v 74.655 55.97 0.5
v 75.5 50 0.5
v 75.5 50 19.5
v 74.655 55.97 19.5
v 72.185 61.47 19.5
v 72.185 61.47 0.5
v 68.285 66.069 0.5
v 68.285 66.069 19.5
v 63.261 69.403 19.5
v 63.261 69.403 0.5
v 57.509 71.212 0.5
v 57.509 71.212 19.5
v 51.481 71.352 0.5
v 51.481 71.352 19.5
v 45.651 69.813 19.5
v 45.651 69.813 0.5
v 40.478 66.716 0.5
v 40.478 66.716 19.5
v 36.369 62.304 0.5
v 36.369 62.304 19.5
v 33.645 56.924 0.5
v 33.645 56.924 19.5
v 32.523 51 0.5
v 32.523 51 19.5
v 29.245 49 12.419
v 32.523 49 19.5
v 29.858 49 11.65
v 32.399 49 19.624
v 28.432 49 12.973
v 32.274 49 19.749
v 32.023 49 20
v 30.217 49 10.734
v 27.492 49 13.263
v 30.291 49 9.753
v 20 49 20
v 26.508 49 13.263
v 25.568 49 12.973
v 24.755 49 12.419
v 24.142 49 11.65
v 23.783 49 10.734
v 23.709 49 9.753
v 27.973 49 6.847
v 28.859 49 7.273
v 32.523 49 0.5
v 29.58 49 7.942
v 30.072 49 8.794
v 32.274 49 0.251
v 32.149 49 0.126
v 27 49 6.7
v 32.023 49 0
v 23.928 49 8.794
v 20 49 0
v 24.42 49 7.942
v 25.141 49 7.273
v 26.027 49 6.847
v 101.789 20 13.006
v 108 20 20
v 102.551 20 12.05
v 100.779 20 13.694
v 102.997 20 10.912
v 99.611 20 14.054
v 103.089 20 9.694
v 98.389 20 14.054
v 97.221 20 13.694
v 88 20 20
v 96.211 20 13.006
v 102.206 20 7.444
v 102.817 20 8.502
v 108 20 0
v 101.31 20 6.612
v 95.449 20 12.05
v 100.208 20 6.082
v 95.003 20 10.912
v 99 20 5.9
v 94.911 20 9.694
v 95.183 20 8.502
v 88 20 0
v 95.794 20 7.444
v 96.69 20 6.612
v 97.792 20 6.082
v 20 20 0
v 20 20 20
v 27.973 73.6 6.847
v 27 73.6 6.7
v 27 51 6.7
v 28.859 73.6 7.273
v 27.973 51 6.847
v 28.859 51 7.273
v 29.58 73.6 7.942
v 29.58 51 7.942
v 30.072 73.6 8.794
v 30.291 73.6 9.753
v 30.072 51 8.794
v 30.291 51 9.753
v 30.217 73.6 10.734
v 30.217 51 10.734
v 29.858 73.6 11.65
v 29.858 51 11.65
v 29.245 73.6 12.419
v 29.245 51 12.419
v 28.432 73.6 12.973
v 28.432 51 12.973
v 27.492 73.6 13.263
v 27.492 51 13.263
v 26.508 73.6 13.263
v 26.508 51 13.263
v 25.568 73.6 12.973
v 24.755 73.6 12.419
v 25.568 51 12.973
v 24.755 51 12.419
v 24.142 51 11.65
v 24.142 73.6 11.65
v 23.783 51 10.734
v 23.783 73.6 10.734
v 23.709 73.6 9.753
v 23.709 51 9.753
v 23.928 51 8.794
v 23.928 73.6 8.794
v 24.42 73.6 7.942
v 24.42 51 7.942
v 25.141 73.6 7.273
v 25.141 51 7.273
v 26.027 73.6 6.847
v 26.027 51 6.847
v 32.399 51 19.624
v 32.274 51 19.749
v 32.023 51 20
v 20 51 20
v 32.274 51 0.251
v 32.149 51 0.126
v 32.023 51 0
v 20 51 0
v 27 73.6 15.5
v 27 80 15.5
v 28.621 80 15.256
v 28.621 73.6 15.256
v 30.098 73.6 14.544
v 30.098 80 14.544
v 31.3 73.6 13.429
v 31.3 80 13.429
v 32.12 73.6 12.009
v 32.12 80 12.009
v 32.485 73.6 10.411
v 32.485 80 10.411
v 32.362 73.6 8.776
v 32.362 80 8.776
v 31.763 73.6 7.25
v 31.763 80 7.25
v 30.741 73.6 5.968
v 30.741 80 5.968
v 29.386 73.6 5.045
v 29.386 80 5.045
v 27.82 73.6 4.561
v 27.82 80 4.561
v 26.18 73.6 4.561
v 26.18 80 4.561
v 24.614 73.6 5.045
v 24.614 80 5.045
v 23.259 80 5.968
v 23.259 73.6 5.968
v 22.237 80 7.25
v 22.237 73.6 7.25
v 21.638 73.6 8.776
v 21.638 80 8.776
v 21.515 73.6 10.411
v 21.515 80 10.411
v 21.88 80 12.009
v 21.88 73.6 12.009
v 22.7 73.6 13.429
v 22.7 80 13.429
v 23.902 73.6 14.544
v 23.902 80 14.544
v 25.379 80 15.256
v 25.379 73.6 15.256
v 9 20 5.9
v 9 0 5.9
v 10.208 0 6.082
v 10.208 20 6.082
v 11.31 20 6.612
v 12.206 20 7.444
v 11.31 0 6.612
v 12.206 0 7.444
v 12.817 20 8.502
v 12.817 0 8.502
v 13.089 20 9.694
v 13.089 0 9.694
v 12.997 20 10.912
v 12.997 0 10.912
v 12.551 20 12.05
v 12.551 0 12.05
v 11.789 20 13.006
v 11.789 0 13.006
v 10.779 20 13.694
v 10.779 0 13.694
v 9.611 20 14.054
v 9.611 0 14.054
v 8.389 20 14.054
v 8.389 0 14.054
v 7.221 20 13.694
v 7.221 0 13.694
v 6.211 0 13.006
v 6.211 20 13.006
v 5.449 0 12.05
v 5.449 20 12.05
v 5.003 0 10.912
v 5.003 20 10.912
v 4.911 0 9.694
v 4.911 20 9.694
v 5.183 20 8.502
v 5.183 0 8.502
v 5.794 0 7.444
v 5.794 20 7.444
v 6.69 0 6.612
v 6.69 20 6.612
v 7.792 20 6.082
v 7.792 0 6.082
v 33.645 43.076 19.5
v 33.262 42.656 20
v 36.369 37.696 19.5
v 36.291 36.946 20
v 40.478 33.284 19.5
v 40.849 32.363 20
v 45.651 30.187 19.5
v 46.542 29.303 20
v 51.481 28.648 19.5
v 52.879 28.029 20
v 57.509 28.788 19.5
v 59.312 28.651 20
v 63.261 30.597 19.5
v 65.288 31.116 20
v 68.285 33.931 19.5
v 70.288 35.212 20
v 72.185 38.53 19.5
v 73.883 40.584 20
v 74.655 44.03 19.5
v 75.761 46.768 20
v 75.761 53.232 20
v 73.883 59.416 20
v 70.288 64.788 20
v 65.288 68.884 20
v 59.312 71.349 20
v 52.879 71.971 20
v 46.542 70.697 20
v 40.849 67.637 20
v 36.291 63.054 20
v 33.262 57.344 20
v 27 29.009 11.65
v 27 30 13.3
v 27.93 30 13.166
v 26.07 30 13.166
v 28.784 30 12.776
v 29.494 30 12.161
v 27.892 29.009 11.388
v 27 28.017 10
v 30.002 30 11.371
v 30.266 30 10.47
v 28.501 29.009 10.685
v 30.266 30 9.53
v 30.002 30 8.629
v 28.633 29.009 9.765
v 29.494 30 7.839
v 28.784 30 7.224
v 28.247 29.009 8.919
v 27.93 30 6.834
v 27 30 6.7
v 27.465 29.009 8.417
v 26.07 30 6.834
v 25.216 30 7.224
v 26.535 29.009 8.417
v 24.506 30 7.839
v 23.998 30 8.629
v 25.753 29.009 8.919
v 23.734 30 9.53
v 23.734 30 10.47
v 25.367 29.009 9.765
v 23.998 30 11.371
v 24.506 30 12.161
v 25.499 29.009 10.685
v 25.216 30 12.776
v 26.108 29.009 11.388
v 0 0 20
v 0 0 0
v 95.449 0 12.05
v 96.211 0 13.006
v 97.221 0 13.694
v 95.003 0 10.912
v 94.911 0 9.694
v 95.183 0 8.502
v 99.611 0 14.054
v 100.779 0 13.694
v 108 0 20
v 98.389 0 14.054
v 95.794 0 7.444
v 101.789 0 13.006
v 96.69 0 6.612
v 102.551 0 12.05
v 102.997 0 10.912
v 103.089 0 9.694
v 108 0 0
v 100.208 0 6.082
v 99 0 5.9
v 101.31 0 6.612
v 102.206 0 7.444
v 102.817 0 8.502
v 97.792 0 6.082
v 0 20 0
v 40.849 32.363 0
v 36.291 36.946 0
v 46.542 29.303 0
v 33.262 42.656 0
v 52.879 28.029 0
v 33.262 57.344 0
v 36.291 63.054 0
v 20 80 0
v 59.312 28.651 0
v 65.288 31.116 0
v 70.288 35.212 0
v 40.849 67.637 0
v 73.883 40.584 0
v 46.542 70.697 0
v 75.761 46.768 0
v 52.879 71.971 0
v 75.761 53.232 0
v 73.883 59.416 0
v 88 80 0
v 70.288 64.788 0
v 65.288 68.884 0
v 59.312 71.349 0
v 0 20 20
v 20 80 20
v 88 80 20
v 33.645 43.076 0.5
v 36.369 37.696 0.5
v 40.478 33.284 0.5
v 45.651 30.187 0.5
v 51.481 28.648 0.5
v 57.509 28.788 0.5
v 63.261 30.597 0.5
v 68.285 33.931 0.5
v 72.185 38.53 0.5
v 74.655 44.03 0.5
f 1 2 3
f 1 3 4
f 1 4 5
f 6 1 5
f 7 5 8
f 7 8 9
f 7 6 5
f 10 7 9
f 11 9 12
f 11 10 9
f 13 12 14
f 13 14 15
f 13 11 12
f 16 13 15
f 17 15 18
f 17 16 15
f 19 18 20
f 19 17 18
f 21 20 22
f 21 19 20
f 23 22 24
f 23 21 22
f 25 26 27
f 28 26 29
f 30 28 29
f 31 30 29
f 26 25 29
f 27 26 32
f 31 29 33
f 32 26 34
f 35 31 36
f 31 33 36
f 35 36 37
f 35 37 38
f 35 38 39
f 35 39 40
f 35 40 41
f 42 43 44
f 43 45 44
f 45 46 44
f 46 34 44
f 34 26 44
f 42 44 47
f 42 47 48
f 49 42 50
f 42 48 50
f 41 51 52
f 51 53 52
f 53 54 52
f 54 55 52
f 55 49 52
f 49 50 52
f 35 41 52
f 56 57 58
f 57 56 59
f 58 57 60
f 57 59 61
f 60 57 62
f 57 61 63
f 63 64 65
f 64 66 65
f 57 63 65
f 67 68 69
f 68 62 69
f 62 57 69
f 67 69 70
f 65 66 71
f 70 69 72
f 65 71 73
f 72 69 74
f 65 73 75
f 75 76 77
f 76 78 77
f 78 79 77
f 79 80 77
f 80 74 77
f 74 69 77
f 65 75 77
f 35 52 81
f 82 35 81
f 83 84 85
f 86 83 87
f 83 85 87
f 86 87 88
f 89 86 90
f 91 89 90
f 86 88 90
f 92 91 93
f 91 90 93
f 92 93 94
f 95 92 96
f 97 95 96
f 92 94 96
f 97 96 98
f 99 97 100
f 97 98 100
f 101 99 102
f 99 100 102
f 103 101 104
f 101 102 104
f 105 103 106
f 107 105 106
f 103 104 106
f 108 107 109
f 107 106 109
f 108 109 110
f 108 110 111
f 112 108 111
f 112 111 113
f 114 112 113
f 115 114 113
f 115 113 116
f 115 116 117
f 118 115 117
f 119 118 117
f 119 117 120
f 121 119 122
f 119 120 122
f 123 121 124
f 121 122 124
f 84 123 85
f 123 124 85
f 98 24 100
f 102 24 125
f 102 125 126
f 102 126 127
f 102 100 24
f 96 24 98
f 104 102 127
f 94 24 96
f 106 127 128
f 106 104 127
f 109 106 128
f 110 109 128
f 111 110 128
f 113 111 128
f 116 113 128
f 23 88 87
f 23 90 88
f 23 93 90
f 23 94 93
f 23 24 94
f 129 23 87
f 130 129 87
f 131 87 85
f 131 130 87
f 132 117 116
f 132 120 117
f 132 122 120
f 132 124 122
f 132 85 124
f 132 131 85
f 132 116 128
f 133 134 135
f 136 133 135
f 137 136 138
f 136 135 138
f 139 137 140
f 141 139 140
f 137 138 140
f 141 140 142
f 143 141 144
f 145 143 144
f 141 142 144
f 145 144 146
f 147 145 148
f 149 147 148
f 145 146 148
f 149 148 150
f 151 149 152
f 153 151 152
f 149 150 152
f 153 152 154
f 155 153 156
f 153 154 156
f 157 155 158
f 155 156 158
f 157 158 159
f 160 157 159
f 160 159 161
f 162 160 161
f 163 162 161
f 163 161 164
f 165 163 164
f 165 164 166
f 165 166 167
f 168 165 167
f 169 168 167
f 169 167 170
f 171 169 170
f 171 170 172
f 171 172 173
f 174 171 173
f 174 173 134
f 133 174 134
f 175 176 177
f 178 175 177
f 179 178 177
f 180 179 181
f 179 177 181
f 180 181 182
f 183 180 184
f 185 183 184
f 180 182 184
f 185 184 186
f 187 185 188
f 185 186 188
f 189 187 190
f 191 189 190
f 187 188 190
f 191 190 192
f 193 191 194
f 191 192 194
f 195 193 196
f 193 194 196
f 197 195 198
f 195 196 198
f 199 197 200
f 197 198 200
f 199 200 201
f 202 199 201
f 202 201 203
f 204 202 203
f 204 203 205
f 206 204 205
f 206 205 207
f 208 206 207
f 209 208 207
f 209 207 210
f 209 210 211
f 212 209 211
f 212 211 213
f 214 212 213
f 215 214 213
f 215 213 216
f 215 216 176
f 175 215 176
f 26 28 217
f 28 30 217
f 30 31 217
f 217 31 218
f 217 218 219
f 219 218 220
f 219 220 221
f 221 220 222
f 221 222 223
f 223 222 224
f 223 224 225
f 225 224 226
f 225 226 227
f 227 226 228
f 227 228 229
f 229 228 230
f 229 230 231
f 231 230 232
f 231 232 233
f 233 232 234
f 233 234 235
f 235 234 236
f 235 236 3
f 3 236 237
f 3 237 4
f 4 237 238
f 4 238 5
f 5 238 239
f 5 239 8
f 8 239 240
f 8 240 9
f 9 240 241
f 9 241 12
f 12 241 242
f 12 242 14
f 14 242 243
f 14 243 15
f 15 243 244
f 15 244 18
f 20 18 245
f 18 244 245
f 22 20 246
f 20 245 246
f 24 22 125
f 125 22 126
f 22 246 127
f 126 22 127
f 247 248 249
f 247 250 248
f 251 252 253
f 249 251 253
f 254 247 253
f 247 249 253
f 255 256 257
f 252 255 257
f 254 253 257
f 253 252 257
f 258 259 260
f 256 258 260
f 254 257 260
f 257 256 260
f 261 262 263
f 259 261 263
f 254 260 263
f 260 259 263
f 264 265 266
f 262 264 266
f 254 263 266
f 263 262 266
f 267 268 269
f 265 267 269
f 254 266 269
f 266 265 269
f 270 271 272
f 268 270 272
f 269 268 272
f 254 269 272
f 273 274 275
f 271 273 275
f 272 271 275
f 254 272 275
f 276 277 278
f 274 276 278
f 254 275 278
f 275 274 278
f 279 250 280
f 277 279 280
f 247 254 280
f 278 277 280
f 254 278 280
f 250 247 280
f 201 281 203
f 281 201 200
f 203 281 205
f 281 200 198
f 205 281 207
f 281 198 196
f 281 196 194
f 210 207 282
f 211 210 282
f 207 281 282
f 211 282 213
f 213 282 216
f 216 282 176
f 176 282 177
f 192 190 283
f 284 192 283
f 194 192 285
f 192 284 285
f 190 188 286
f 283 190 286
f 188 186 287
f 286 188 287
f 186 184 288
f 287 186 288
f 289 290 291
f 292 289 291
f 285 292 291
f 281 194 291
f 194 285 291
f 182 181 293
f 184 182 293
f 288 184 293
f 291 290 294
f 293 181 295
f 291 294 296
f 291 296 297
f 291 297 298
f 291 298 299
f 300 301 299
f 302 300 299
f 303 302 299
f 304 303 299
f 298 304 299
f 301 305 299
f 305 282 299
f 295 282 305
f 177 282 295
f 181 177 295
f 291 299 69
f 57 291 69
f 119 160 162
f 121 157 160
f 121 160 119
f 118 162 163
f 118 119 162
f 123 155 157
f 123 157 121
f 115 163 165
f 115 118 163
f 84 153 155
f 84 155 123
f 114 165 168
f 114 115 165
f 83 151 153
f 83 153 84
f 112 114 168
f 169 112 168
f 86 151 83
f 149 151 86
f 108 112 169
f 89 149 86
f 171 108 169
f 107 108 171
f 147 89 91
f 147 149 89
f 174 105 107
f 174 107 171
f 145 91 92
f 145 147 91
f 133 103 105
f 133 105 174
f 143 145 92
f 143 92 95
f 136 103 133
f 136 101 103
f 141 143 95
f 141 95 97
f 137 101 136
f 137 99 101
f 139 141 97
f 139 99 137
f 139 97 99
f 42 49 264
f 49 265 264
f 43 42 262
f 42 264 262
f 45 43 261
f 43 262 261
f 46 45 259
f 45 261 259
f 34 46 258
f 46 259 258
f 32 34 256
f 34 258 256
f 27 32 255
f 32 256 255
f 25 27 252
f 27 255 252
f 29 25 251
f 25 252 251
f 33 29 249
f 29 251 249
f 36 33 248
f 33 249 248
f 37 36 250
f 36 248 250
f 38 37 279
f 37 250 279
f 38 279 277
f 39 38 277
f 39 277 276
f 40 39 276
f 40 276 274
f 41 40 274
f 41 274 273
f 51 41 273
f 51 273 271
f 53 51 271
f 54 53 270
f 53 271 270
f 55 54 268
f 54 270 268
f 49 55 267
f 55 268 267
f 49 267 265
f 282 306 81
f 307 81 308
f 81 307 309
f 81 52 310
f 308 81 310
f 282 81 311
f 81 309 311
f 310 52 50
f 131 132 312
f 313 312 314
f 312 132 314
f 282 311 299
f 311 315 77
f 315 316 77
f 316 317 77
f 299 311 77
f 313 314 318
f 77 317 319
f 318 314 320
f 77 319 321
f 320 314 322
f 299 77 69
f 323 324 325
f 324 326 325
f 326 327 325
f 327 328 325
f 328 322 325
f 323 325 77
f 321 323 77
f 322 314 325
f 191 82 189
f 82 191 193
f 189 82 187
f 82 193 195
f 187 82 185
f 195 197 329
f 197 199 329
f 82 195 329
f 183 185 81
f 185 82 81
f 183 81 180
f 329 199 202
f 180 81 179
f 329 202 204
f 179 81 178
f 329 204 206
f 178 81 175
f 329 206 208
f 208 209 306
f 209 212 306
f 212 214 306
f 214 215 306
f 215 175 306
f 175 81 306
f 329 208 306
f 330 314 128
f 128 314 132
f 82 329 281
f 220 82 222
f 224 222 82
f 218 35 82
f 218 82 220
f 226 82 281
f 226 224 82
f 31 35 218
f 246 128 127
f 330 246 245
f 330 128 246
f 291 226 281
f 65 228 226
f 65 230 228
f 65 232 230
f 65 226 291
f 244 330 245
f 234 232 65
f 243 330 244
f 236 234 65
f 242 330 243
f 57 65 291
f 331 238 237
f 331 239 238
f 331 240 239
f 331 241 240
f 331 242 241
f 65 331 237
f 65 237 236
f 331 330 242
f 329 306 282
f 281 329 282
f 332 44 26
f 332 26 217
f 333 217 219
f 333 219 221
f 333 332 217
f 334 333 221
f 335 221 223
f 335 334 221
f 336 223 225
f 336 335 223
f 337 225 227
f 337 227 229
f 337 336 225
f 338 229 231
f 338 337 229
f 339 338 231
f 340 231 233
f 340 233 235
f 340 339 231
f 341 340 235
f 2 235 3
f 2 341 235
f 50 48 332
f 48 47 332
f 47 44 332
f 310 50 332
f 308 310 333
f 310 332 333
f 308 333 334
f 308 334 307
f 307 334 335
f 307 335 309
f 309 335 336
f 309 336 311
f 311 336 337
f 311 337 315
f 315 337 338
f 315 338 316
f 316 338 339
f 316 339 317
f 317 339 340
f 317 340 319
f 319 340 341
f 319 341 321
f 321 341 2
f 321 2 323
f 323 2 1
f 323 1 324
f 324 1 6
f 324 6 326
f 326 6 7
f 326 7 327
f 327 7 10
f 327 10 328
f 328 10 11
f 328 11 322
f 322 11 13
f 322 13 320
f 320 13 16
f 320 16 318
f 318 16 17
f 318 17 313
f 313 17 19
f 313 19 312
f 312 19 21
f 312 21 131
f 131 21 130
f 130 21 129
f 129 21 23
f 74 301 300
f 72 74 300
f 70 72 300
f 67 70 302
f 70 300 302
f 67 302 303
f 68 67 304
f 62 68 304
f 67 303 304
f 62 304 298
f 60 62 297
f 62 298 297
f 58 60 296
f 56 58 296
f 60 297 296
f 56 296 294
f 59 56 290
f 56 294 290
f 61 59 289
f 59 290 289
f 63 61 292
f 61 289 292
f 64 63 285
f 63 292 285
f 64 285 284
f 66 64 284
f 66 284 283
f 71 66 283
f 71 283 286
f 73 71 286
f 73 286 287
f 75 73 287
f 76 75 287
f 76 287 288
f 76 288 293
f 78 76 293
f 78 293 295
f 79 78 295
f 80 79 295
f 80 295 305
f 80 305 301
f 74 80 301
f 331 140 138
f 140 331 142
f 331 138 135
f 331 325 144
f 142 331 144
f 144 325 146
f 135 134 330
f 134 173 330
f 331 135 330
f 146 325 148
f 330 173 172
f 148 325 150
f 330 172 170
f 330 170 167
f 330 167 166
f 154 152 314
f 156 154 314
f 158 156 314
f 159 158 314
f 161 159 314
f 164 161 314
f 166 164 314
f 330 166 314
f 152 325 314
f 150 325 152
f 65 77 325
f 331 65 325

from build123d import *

# Parameters (mm, degrees)
SCHIZZO1_R                                          = 21.5
ESTRUSIONE_ESTRUSIONE1_DEPTH                        = 20
F_8_2_8_2_DIAMETER_HOLE1_D                          = 8.2
CBORE_FOR_M6_HEX_SOCKET_HEAD_CAP_SCREW1_D           = 6.6
CBORE_FOR_M6_HEX_SOCKET_HEAD_CAP_SCREW1_DEPTH       = 50
CBORE_FOR_M6_HEX_SOCKET_HEAD_CAP_SCREW1_CBORE_D     = 11
CBORE_FOR_M6_HEX_SOCKET_HEAD_CAP_SCREW1_CBORE_DEPTH = 6.4
CBORE_FOR_M6_HEX_SOCKET_HEAD_CAP_SCREW1_TIP         = 1.982840043
SCHIZZO7_W                                          = 15.52137419
SCHIZZO7_H                                          = 2
TAGLIO_ESTRUSIONE1_DEPTH                            = 136.882302012
CHAMFER1_SIZE                                       = 0.5
CHAMFER2_SIZE                                       = 0.5


with BuildPart() as part:
    # Schizzo1 → Estrusione-Estrusione1 (new body)
    with BuildSketch(Plane.XY):
        Polygon((0, 0), (108, 0), (108, 20), (88, 20), (88, 80), (20, 80), (20, 20), (0, 20), align=None)
        with Locations((54, 50)):
            Circle(SCHIZZO1_R, mode=Mode.SUBTRACT)
    extrude(amount=ESTRUSIONE_ESTRUSIONE1_DEPTH)

    # Ø8.2 (8.2) Diameter Hole1 (through all)
    with Locations(Plane(origin=(9, 20, 10), x_dir=(0, 0, 1), z_dir=(0, 1, 0))):
        with Locations((0, 0), (0, 90)):
            Hole(F_8_2_8_2_DIAMETER_HOLE1_D / 2)

    # CBORE for M6 Hex Socket Head Cap Screw1
    with Locations(Plane(origin=(27, 80, 10), x_dir=(0, 0, 1), z_dir=(0, 1, 0))):
        with Locations((0, 0)):
            CounterBoreHole(CBORE_FOR_M6_HEX_SOCKET_HEAD_CAP_SCREW1_D / 2, CBORE_FOR_M6_HEX_SOCKET_HEAD_CAP_SCREW1_CBORE_D / 2, CBORE_FOR_M6_HEX_SOCKET_HEAD_CAP_SCREW1_CBORE_DEPTH, depth=CBORE_FOR_M6_HEX_SOCKET_HEAD_CAP_SCREW1_DEPTH)
            with Locations((0, 0, -(CBORE_FOR_M6_HEX_SOCKET_HEAD_CAP_SCREW1_DEPTH + CBORE_FOR_M6_HEX_SOCKET_HEAD_CAP_SCREW1_TIP / 2))):  # 118° drill point
                Cone(0, CBORE_FOR_M6_HEX_SOCKET_HEAD_CAP_SCREW1_D / 2, CBORE_FOR_M6_HEX_SOCKET_HEAD_CAP_SCREW1_TIP, mode=Mode.SUBTRACT)

    # Schizzo7 → Taglio-Estrusione1 (cut, through all)
    with BuildSketch(Plane(origin=(0, 0, 0), x_dir=(-1, 0, 0), z_dir=(0, 0, -1))):
        with Locations((-27.66540179, 50)):
            Rectangle(SCHIZZO7_W, SCHIZZO7_H)
    extrude(amount=-TAGLIO_ESTRUSIONE1_DEPTH, mode=Mode.SUBTRACT)

    # Chamfer1
    chamfer1_edges = [part.edges().sort_by_distance(p)[0] for p in [
        (54.500135336, 71.494182112, 0),
    ]]
    chamfer(chamfer1_edges, length=CHAMFER1_SIZE)

    # Chamfer2
    chamfer2_edges = [part.edges().sort_by_distance(p)[0] for p in [
        (54.500135336, 28.505817888, 20),
    ]]
    chamfer(chamfer2_edges, length=CHAMFER2_SIZE)


solid = part.part
